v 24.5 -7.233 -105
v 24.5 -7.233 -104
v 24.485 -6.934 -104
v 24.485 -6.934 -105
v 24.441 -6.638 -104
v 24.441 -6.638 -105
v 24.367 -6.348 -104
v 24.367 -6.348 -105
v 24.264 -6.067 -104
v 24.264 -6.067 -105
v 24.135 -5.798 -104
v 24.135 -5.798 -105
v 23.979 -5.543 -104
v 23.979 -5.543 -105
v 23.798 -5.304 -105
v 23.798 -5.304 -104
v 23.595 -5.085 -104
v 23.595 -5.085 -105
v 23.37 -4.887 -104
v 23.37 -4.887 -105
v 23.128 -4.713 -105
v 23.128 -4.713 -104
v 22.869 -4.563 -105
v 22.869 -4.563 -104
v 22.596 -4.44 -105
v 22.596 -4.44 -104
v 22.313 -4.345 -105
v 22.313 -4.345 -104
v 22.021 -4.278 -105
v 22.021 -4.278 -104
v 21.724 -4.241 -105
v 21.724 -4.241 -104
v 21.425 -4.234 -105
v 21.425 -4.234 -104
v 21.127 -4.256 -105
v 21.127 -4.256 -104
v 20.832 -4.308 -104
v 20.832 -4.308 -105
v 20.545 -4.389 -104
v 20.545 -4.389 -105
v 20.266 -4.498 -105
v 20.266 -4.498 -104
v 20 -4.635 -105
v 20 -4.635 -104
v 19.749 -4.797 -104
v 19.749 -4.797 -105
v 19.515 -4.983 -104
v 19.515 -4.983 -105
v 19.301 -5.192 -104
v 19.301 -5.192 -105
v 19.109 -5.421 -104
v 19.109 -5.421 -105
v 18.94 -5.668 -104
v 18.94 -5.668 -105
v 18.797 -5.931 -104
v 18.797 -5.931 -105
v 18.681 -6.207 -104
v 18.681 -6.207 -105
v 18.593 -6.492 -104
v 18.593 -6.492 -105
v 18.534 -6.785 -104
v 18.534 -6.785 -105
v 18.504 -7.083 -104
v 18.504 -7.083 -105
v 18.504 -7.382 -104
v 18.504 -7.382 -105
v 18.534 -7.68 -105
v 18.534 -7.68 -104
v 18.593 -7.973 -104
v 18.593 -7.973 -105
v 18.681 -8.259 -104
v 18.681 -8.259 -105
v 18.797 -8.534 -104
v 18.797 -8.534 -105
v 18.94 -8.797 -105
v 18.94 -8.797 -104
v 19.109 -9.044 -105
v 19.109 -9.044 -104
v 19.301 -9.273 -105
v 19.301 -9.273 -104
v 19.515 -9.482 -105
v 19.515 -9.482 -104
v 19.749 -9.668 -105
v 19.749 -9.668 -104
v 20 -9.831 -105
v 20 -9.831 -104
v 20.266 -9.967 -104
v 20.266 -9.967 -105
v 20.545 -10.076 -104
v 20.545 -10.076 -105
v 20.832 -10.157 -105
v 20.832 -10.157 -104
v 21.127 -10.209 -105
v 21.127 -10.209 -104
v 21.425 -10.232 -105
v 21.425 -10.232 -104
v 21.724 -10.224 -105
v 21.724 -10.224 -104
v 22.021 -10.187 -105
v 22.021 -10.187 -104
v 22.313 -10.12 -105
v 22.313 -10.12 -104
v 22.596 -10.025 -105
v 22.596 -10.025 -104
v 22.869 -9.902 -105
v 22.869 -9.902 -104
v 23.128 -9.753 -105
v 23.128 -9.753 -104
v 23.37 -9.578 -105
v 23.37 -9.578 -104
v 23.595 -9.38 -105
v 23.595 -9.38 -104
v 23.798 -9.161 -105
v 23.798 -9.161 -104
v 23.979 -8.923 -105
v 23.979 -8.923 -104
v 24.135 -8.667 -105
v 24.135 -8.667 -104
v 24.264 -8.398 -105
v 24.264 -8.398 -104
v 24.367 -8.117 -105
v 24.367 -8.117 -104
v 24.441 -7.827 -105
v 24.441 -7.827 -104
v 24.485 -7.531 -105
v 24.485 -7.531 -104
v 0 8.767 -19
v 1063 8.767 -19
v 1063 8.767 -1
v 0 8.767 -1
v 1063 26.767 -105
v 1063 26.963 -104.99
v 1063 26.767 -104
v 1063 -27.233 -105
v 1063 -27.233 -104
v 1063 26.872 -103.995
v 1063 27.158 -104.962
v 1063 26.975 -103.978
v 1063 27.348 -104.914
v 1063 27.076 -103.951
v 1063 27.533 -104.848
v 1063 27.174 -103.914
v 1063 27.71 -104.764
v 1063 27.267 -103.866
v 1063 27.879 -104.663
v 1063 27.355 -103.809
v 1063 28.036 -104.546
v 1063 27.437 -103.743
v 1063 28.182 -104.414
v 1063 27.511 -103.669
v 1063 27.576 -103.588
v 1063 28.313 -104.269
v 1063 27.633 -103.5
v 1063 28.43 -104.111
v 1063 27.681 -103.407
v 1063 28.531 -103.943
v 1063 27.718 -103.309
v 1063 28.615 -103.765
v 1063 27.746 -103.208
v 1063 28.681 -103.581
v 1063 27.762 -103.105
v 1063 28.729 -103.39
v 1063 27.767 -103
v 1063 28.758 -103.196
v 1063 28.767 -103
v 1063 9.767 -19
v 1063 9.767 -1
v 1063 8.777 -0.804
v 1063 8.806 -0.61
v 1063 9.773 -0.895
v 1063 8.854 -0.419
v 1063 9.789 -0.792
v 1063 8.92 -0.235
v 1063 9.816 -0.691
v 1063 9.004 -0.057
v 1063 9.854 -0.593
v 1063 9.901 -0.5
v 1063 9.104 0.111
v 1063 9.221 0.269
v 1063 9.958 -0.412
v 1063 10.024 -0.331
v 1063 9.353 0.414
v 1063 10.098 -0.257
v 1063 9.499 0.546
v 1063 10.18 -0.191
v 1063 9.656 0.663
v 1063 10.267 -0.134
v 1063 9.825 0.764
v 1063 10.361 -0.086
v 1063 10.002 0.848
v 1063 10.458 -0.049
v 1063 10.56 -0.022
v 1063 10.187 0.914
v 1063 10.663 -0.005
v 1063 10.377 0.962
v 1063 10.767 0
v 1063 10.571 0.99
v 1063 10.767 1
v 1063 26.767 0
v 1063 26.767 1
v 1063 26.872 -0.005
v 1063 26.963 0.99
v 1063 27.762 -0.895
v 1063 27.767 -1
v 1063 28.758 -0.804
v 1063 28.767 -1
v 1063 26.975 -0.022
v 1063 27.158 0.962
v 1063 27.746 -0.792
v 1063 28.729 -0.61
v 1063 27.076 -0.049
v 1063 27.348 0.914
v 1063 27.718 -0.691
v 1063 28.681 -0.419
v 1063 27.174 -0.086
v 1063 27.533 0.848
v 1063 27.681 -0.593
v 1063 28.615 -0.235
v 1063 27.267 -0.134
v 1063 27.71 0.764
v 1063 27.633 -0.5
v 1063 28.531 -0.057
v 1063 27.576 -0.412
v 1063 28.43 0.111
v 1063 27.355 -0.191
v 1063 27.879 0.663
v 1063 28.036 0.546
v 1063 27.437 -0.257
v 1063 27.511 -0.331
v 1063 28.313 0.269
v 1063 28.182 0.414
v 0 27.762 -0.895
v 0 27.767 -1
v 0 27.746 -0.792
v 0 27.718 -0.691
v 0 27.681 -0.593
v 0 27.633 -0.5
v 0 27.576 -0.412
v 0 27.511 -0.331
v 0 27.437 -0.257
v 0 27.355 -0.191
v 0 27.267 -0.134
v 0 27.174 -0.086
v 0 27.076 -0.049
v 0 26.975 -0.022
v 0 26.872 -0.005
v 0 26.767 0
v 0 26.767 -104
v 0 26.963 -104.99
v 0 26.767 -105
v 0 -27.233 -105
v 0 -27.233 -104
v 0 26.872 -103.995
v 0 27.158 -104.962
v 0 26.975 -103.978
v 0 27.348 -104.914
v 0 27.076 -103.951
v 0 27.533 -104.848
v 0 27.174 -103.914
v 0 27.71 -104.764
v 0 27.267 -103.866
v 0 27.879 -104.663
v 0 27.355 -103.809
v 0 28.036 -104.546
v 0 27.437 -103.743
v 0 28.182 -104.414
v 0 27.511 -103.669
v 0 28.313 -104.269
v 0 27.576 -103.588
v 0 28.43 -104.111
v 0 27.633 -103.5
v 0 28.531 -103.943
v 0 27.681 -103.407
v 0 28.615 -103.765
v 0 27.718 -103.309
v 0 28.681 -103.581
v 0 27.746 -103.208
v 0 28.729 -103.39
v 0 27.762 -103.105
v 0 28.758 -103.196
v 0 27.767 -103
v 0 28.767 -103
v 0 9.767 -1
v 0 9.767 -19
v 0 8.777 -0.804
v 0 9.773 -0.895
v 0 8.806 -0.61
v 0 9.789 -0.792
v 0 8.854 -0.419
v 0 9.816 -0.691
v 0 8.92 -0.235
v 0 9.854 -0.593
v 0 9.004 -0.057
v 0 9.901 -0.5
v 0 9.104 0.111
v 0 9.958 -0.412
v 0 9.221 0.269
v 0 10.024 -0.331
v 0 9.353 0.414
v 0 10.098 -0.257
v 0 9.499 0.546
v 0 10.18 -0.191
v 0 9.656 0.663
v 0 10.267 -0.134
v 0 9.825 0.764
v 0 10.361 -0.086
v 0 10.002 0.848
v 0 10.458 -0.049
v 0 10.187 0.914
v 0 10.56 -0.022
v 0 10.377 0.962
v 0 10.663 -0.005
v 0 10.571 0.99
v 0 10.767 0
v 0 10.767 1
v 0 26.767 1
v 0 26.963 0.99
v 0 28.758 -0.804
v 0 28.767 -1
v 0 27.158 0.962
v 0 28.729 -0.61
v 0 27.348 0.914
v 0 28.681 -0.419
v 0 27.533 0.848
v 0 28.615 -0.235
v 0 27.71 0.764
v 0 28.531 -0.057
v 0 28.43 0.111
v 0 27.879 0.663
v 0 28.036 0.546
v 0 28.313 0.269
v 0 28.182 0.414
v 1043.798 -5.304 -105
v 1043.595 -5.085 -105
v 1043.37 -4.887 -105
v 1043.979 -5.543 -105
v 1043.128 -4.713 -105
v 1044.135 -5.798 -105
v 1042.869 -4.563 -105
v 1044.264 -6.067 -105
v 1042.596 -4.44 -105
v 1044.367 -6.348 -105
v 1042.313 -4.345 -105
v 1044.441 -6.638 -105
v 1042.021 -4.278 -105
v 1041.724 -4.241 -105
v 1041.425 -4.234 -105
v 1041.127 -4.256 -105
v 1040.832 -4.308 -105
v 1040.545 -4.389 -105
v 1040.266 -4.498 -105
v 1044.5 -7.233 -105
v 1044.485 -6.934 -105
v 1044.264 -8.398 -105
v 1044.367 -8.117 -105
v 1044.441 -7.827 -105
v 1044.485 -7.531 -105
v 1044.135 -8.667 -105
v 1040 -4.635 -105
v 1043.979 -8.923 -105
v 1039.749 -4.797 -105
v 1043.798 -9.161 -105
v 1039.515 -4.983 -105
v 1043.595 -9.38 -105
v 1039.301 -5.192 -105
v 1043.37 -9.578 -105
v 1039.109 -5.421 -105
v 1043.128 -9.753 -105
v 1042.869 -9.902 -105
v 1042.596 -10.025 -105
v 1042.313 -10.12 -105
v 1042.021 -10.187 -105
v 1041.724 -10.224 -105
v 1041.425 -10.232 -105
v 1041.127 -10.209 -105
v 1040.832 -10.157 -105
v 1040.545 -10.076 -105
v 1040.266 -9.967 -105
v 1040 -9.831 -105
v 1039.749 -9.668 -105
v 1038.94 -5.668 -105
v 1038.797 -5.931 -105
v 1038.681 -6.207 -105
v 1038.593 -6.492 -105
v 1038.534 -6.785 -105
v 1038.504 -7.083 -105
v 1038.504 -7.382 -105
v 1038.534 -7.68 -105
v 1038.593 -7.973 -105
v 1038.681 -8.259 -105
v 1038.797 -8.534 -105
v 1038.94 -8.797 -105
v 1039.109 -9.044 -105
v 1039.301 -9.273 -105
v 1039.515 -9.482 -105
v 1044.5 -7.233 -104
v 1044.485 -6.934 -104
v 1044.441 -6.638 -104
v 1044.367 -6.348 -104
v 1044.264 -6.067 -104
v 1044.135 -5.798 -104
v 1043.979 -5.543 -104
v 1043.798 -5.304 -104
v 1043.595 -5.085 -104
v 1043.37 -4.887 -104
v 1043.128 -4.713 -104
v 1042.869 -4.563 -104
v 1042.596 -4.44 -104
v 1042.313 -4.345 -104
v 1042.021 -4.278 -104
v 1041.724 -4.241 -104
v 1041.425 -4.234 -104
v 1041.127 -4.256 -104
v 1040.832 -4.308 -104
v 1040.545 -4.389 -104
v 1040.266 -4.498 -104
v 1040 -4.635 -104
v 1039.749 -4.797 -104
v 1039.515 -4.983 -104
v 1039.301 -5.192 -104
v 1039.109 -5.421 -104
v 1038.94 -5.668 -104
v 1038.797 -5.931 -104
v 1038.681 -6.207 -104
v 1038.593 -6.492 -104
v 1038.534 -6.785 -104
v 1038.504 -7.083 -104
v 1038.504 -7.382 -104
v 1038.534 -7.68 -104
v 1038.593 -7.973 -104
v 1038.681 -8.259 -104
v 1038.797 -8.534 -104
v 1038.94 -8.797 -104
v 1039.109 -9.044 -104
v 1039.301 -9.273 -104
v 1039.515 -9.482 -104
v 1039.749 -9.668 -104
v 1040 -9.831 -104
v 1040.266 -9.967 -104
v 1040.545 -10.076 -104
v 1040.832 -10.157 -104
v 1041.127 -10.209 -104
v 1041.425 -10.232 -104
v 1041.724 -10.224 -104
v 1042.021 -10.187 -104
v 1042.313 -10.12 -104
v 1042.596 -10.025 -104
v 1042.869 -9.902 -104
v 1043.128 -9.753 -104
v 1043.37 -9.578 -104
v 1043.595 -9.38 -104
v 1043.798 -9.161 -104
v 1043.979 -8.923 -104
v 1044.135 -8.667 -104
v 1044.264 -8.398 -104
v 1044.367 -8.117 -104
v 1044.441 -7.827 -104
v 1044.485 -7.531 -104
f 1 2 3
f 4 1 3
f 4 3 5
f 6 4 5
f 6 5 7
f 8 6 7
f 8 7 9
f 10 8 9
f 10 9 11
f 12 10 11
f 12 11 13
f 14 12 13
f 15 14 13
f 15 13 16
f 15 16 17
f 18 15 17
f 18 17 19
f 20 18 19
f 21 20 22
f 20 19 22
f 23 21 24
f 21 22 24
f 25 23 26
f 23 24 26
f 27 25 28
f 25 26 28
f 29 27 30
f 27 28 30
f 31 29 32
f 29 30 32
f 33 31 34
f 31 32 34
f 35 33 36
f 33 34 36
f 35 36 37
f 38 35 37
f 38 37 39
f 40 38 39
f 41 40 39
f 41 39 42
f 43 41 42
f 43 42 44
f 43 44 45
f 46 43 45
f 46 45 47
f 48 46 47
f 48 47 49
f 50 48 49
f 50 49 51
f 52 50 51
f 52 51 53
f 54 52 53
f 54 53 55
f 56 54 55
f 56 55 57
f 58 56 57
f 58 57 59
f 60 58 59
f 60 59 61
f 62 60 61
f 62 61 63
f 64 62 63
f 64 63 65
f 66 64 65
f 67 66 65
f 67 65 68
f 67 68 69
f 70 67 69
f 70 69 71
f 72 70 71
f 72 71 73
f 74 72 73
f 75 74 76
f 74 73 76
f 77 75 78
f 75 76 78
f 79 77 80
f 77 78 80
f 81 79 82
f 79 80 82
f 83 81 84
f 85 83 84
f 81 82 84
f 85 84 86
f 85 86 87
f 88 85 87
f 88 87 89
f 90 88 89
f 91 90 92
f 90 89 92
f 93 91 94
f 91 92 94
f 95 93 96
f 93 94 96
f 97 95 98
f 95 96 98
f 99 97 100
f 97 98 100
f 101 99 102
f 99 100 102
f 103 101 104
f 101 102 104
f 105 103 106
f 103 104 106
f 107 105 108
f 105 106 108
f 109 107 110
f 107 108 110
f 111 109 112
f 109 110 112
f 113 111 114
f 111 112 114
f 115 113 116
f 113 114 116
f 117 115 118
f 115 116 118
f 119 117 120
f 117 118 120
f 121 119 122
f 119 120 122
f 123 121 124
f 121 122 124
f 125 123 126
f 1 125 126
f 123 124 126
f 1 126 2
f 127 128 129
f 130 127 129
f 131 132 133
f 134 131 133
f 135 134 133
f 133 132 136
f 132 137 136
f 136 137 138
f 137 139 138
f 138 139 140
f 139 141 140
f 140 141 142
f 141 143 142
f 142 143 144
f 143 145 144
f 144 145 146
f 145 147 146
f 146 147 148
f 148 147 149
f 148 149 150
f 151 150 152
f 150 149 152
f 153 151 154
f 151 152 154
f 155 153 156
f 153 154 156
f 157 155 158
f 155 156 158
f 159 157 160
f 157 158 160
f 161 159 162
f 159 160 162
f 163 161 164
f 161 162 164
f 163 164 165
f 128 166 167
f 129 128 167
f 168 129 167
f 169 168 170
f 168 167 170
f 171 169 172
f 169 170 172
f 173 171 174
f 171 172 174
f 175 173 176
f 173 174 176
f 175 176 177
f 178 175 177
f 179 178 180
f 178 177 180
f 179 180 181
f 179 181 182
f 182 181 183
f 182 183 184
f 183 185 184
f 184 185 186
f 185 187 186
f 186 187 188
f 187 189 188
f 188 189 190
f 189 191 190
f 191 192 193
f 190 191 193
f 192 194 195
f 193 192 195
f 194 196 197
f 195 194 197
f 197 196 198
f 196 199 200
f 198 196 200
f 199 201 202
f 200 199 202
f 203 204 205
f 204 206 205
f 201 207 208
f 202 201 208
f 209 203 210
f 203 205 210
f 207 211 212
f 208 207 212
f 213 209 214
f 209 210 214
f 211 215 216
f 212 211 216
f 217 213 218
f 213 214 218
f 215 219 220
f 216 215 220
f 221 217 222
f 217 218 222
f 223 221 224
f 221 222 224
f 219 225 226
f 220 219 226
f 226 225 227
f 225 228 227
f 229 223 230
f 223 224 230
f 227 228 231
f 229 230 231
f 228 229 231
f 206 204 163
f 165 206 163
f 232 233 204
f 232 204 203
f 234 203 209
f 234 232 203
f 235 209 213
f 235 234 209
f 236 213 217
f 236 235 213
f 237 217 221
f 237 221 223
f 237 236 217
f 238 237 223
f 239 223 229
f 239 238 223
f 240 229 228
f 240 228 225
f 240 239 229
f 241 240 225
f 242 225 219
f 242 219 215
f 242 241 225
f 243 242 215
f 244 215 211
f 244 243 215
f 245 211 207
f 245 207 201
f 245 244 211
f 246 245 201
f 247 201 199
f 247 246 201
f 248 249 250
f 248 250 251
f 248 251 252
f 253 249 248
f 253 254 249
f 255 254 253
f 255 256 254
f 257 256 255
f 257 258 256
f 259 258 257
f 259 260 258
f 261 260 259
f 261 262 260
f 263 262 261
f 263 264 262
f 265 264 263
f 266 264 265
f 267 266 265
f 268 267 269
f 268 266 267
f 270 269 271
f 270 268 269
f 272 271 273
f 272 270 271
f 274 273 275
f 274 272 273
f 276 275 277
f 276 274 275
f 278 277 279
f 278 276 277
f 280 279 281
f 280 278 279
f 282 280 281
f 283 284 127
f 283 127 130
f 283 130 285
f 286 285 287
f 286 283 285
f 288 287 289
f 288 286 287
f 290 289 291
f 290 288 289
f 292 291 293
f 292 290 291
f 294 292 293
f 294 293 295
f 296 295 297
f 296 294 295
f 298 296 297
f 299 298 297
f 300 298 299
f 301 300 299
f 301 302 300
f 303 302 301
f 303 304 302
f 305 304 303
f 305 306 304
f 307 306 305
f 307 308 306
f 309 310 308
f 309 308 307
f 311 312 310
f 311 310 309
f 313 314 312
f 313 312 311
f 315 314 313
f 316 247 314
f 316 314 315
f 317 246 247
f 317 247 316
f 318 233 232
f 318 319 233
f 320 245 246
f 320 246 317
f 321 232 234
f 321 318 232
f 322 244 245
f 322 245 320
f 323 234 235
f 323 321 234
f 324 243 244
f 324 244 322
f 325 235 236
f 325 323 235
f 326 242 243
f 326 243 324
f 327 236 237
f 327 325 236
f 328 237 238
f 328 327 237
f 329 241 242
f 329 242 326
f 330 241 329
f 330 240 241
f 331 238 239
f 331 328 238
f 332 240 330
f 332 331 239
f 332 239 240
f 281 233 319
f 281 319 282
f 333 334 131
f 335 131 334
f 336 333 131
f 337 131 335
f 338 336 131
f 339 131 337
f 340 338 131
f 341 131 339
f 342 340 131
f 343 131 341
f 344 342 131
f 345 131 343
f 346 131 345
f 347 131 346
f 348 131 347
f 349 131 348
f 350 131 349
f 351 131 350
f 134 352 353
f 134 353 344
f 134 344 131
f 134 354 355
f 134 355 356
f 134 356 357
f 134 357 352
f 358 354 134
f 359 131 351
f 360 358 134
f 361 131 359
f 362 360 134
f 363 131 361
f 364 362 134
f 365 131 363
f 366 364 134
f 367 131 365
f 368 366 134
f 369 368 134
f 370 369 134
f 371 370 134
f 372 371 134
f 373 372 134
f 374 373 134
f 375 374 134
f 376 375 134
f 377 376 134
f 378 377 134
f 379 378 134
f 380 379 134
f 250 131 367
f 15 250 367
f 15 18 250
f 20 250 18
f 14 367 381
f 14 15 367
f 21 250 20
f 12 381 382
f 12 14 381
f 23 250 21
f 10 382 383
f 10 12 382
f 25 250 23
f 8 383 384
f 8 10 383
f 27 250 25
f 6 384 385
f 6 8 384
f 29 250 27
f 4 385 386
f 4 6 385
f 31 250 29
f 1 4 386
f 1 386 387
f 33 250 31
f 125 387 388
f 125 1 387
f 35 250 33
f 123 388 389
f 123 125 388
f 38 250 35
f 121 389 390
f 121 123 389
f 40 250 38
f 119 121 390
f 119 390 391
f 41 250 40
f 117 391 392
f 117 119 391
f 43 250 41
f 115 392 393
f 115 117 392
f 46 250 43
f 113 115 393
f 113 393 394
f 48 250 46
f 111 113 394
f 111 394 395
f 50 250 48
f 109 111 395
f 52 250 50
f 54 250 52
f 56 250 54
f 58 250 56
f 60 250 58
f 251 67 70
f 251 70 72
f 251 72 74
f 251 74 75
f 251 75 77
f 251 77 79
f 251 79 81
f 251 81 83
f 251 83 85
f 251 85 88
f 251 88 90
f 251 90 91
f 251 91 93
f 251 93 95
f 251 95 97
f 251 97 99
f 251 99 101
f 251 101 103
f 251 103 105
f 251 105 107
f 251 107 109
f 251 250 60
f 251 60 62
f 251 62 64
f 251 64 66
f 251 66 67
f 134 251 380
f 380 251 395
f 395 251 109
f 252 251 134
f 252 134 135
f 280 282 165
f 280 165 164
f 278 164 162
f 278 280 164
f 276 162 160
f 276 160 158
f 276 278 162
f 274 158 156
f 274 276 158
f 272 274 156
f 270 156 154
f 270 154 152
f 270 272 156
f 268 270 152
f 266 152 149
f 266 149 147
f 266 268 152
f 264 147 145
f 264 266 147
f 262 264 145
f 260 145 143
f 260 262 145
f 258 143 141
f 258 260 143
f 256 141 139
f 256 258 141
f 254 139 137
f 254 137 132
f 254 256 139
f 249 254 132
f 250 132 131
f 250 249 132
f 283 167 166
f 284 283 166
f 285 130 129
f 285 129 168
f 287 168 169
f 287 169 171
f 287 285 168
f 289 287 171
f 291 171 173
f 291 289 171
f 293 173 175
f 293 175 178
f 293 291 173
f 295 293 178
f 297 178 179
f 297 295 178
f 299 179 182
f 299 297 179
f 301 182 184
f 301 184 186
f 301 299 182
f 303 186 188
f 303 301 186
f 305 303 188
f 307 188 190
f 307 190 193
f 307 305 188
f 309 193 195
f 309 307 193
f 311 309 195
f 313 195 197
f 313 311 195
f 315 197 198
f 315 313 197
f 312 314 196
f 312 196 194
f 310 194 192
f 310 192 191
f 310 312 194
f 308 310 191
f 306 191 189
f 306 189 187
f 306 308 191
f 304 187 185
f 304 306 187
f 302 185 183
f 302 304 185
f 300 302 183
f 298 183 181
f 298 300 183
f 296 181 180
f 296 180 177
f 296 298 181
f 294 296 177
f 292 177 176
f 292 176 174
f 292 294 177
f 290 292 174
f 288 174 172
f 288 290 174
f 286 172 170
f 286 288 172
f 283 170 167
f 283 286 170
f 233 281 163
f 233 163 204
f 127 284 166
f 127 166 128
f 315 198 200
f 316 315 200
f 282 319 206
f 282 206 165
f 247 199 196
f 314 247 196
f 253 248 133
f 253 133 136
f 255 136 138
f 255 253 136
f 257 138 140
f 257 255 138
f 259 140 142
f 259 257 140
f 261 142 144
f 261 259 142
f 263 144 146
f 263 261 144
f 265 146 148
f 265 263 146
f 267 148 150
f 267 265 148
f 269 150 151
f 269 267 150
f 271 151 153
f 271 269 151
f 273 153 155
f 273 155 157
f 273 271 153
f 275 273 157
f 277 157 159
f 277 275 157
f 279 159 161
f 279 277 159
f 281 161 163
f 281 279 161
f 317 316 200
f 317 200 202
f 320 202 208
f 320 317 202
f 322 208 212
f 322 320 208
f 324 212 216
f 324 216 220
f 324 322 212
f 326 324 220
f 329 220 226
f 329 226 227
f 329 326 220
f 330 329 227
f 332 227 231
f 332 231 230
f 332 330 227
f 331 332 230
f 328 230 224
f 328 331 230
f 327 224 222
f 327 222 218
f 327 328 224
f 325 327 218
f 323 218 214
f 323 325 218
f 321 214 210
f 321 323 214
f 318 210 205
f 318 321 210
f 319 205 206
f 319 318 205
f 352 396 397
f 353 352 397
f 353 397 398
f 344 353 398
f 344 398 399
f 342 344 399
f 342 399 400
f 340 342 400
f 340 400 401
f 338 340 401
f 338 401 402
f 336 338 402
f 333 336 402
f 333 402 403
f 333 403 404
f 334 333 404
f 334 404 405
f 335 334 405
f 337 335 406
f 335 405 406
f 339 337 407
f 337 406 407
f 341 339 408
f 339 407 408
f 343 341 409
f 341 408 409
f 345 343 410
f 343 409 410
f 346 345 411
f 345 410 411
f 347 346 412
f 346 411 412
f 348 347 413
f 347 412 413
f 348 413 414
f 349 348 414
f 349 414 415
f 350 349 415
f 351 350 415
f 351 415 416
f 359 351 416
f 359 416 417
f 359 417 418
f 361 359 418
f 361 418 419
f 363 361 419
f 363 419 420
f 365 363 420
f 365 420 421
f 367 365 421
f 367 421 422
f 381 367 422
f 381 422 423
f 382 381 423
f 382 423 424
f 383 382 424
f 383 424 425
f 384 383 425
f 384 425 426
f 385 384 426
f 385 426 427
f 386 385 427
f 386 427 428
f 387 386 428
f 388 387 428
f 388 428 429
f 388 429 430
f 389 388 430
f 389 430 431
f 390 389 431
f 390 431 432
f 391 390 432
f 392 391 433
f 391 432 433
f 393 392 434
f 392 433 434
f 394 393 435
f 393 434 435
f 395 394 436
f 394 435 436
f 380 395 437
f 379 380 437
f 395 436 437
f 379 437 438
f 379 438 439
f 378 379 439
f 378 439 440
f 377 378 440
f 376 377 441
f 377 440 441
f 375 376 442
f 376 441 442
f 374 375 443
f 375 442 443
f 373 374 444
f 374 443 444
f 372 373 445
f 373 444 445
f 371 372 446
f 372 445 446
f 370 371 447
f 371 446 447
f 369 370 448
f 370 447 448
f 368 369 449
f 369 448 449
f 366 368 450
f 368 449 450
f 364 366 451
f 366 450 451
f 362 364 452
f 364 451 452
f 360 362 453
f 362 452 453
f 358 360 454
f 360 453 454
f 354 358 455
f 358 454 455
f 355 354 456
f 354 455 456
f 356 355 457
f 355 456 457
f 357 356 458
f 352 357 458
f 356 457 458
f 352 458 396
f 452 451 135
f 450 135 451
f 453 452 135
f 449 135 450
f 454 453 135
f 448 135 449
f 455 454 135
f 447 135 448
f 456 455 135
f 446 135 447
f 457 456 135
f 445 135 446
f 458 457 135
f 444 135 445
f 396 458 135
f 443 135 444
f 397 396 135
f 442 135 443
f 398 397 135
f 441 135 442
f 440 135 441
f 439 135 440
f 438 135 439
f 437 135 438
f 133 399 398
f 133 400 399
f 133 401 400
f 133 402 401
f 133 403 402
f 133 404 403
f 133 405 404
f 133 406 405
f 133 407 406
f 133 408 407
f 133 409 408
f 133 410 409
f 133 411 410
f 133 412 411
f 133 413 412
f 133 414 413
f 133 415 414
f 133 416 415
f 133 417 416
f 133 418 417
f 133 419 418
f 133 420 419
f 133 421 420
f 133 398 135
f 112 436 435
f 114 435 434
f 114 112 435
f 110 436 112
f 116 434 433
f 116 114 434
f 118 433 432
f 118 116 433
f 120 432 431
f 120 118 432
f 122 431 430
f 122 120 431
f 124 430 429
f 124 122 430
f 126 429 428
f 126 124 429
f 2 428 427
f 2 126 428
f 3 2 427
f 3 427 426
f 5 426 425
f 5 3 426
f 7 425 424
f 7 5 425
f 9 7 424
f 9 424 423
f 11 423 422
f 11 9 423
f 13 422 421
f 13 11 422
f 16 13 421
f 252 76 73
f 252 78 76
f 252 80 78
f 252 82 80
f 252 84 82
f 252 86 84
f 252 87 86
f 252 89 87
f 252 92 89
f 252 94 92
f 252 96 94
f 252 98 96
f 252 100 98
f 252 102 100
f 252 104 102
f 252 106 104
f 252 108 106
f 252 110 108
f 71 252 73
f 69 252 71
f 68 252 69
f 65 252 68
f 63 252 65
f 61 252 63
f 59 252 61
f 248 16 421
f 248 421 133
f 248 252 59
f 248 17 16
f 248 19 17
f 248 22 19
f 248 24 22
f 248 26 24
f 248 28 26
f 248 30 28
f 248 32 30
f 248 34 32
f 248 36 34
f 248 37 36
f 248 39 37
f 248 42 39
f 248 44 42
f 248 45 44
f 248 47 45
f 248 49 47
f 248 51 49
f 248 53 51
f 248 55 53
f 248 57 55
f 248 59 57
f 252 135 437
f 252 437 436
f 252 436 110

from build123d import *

# Parameters (mm, degrees)
BASE_FLANGE1_DEPTH = 1063
SKETCH2_R          = 3
CUT_EXTRUDE1_DEPTH = 10


# Sheet-metal steps are written as plain solids
with BuildPart() as part:
    # Sketch1 → Base-Flange1 (new body)
    with BuildSketch(Plane(origin=(0, 0, 0), x_dir=(0, 0, -1), z_dir=(1, 0, 0))):
        with BuildLine():
            Line((104, -27.232585832), (104, 26.767414168))
            ThreePointArc((104, 26.767414168), (103.707106781, 27.474520949), (103, 27.767414168))
            Line((103, 27.767414168), (1, 27.767414168))
            ThreePointArc((1, 27.767414168), (0.292893219, 27.474520949), (0, 26.767414168))
            Line((0, 26.767414168), (0, 10.767414168))
            ThreePointArc((0, 10.767414168), (0.292893219, 10.060307386), (1, 9.767414168))
            Line((1, 9.767414168), (19, 9.767414168))
            Line((19, 9.767414168), (19, 8.767414168))
            Line((19, 8.767414168), (1, 8.767414168))
            ThreePointArc((1, 8.767414168), (-0.414213562, 9.353200605), (-1, 10.767414168))
            Line((-1, 10.767414168), (-1, 26.767414168))
            ThreePointArc((-1, 26.767414168), (-0.414213562, 28.18162773), (1, 28.767414168))
            Line((1, 28.767414168), (103, 28.767414168))
            ThreePointArc((103, 28.767414168), (104.414213562, 28.18162773), (105, 26.767414168))
            Line((105, 26.767414168), (105, -27.232585832))
            Line((105, -27.232585832), (104, -27.232585832))
        make_face()
    extrude(amount=BASE_FLANGE1_DEPTH)

    # Sketch2 → Cut-Extrude1 (cut)
    with BuildSketch(Plane.XY.offset(-104)):
        with Locations((21.5, -7.232585832)):
            Circle(SKETCH2_R)
        with Locations((1041.5, -7.232585832)):
            Circle(SKETCH2_R)
    extrude(amount=-CUT_EXTRUDE1_DEPTH, mode=Mode.SUBTRACT)


solid = part.part
